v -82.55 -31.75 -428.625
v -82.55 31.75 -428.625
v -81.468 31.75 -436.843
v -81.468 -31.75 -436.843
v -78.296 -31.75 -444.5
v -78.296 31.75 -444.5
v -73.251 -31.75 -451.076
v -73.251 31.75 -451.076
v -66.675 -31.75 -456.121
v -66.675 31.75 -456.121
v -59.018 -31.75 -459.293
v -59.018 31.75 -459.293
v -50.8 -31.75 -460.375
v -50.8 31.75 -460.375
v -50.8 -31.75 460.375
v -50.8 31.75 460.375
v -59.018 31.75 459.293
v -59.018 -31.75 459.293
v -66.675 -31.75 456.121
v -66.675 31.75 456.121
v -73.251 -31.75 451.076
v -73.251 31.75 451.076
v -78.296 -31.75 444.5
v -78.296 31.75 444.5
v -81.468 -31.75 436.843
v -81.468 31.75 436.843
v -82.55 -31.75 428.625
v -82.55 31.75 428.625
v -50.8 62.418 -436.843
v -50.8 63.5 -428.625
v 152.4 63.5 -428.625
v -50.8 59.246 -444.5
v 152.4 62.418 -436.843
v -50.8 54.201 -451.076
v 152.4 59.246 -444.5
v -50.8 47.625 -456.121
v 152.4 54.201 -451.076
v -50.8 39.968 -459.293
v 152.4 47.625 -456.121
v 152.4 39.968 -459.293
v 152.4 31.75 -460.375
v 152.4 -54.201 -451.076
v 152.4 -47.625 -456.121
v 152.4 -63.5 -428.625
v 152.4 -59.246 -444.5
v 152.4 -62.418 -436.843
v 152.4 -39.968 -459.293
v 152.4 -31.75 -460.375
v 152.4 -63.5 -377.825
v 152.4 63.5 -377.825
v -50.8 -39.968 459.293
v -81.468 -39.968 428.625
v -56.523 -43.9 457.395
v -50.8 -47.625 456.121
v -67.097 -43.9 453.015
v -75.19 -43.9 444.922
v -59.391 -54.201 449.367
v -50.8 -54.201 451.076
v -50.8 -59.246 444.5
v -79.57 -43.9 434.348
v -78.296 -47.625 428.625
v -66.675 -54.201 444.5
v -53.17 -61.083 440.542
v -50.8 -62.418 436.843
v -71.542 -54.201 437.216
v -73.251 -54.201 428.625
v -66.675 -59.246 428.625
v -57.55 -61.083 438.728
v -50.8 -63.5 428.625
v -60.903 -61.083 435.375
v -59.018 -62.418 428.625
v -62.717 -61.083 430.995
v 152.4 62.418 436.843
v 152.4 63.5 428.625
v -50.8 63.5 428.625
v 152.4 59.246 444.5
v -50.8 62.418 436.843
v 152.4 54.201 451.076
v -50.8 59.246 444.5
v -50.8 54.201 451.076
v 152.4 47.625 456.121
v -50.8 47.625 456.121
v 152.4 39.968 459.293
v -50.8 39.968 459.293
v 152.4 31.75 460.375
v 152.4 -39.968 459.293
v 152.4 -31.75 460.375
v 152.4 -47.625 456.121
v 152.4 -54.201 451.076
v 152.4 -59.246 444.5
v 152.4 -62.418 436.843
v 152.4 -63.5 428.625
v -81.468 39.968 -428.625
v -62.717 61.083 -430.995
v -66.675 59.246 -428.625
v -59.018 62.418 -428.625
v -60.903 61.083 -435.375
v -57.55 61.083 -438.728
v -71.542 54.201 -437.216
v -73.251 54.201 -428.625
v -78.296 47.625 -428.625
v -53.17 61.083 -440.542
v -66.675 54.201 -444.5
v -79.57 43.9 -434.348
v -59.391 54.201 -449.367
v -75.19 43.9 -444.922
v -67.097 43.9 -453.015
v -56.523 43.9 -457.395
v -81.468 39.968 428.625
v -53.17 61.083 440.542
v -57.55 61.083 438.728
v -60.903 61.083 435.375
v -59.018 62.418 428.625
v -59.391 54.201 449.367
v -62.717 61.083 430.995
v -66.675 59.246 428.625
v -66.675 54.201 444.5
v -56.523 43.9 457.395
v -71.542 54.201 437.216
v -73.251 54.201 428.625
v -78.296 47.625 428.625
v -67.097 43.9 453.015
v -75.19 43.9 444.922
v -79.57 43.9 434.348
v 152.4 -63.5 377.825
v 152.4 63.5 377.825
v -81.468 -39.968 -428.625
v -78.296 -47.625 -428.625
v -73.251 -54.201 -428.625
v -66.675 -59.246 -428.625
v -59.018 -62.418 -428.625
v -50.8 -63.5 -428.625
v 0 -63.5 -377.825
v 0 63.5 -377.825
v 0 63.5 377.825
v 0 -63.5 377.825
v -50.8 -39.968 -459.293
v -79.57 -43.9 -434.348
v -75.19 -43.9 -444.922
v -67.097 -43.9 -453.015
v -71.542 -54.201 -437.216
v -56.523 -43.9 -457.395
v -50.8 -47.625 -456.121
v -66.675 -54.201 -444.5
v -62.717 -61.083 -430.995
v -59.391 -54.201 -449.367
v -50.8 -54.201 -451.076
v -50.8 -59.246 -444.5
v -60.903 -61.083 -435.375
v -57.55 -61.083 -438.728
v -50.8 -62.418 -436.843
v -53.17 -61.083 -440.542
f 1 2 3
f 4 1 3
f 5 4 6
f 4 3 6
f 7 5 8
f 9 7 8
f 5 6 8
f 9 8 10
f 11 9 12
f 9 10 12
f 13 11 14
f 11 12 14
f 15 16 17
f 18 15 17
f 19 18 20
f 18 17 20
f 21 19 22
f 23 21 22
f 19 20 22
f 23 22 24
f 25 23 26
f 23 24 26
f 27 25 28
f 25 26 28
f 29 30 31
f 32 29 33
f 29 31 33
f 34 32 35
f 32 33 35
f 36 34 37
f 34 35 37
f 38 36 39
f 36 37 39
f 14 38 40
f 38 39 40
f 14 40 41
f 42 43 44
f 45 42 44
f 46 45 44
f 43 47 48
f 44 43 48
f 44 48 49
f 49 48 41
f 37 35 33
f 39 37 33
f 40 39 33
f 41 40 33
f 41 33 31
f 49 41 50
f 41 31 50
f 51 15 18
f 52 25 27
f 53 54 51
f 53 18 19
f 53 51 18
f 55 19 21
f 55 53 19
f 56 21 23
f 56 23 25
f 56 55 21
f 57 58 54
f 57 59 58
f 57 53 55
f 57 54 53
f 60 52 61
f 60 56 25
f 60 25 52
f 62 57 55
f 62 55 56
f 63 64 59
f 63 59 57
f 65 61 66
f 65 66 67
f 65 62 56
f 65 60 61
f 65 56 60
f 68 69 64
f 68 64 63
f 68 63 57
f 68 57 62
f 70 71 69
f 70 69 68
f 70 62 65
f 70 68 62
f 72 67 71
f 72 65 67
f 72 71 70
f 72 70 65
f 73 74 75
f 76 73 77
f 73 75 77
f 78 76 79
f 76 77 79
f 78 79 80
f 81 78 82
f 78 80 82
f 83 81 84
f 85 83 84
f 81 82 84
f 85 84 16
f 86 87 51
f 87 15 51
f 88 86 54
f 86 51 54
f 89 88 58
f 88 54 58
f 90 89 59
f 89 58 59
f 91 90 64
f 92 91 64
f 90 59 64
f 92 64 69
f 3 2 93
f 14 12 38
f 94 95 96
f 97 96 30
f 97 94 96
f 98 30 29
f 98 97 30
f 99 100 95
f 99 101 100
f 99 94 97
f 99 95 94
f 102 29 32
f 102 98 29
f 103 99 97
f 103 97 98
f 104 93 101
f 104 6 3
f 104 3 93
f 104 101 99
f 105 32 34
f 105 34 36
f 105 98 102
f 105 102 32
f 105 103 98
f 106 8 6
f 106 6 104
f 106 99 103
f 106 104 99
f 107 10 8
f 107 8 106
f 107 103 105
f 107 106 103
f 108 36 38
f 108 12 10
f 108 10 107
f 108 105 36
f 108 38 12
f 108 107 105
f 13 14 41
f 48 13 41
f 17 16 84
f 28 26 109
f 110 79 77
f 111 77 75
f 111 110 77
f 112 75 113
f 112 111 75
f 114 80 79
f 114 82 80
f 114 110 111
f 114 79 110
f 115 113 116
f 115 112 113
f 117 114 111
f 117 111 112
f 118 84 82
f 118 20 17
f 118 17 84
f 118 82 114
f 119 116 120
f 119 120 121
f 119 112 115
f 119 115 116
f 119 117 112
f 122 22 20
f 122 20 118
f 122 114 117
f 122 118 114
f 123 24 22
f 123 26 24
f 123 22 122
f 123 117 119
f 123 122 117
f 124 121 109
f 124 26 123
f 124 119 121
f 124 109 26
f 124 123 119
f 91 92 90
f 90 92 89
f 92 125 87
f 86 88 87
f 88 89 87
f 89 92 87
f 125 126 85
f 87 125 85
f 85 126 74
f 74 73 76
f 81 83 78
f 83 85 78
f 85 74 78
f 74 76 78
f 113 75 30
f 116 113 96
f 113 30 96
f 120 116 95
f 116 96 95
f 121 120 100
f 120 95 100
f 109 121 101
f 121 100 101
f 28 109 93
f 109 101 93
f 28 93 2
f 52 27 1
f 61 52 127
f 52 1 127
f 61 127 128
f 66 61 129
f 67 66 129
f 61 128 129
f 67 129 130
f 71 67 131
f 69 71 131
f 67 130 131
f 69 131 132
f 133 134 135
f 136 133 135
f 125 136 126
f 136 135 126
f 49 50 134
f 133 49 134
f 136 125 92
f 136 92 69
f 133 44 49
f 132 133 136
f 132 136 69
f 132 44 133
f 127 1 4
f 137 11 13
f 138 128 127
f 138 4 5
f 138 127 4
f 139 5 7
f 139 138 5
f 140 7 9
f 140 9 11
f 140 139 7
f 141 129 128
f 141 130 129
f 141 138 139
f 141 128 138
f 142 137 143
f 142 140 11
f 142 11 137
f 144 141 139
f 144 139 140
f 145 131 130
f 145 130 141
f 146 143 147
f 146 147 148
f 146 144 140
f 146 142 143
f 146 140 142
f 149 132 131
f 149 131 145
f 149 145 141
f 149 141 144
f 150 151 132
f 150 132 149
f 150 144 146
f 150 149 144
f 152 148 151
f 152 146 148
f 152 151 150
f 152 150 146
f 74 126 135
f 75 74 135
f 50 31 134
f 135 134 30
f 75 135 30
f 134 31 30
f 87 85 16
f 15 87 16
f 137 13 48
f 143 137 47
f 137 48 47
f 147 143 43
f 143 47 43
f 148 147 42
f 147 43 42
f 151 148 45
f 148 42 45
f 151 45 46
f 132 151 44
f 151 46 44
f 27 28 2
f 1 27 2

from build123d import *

# Parameters (mm, degrees)
BOSS_EXTRUDE1_DEPTH = 63.5
FILLET1_R           = 31.75


with BuildPart() as part:
    # Sketch1 → Boss-Extrude1 (new body, symmetric)
    with BuildSketch(Plane(origin=(0, 0, 0), x_dir=(1, 0, 0), z_dir=(0, 1, 0))):
        with BuildLine():
            Line((0, 377.825), (0, -377.825))
            Line((0, -377.825), (152.4, -377.825))
            Line((152.4, -377.825), (152.4, -460.375))
            Line((152.4, -460.375), (-50.8, -460.375))
            ThreePointArc((-50.8, -460.375), (-73.250640303, -451.075640303), (-82.55, -428.625))
            Line((-82.55, -428.625), (-82.55, 428.625))
            ThreePointArc((-82.55, 428.625), (-73.250640303, 451.075640303), (-50.8, 460.375))
            Line((-50.8, 460.375), (152.4, 460.375))
            Line((152.4, 460.375), (152.4, 377.825))
            Line((152.4, 377.825), (0, 377.825))
        make_face()
    extrude(amount=BOSS_EXTRUDE1_DEPTH, both=True)

    # Fillet1
    fillet1_edges = [part.edges().sort_by_distance(p)[0] for p in [
        (-73.250640303, -63.5, 451.075640303),
        (-82.55, -63.5, 0),
        (-73.250640303, -63.5, -451.075640303),
        (50.8, -63.5, -460.375),
        (50.8, 63.5, -460.375),
        (-73.250640303, 63.5, -451.075640303),
        (-82.55, 63.5, 0),
        (-73.250640303, 63.5, 451.075640303),
        (50.8, 63.5, 460.375),
        (50.8, -63.5, 460.375),
    ]]
    fillet(fillet1_edges, radius=FILLET1_R)


solid = part.part
